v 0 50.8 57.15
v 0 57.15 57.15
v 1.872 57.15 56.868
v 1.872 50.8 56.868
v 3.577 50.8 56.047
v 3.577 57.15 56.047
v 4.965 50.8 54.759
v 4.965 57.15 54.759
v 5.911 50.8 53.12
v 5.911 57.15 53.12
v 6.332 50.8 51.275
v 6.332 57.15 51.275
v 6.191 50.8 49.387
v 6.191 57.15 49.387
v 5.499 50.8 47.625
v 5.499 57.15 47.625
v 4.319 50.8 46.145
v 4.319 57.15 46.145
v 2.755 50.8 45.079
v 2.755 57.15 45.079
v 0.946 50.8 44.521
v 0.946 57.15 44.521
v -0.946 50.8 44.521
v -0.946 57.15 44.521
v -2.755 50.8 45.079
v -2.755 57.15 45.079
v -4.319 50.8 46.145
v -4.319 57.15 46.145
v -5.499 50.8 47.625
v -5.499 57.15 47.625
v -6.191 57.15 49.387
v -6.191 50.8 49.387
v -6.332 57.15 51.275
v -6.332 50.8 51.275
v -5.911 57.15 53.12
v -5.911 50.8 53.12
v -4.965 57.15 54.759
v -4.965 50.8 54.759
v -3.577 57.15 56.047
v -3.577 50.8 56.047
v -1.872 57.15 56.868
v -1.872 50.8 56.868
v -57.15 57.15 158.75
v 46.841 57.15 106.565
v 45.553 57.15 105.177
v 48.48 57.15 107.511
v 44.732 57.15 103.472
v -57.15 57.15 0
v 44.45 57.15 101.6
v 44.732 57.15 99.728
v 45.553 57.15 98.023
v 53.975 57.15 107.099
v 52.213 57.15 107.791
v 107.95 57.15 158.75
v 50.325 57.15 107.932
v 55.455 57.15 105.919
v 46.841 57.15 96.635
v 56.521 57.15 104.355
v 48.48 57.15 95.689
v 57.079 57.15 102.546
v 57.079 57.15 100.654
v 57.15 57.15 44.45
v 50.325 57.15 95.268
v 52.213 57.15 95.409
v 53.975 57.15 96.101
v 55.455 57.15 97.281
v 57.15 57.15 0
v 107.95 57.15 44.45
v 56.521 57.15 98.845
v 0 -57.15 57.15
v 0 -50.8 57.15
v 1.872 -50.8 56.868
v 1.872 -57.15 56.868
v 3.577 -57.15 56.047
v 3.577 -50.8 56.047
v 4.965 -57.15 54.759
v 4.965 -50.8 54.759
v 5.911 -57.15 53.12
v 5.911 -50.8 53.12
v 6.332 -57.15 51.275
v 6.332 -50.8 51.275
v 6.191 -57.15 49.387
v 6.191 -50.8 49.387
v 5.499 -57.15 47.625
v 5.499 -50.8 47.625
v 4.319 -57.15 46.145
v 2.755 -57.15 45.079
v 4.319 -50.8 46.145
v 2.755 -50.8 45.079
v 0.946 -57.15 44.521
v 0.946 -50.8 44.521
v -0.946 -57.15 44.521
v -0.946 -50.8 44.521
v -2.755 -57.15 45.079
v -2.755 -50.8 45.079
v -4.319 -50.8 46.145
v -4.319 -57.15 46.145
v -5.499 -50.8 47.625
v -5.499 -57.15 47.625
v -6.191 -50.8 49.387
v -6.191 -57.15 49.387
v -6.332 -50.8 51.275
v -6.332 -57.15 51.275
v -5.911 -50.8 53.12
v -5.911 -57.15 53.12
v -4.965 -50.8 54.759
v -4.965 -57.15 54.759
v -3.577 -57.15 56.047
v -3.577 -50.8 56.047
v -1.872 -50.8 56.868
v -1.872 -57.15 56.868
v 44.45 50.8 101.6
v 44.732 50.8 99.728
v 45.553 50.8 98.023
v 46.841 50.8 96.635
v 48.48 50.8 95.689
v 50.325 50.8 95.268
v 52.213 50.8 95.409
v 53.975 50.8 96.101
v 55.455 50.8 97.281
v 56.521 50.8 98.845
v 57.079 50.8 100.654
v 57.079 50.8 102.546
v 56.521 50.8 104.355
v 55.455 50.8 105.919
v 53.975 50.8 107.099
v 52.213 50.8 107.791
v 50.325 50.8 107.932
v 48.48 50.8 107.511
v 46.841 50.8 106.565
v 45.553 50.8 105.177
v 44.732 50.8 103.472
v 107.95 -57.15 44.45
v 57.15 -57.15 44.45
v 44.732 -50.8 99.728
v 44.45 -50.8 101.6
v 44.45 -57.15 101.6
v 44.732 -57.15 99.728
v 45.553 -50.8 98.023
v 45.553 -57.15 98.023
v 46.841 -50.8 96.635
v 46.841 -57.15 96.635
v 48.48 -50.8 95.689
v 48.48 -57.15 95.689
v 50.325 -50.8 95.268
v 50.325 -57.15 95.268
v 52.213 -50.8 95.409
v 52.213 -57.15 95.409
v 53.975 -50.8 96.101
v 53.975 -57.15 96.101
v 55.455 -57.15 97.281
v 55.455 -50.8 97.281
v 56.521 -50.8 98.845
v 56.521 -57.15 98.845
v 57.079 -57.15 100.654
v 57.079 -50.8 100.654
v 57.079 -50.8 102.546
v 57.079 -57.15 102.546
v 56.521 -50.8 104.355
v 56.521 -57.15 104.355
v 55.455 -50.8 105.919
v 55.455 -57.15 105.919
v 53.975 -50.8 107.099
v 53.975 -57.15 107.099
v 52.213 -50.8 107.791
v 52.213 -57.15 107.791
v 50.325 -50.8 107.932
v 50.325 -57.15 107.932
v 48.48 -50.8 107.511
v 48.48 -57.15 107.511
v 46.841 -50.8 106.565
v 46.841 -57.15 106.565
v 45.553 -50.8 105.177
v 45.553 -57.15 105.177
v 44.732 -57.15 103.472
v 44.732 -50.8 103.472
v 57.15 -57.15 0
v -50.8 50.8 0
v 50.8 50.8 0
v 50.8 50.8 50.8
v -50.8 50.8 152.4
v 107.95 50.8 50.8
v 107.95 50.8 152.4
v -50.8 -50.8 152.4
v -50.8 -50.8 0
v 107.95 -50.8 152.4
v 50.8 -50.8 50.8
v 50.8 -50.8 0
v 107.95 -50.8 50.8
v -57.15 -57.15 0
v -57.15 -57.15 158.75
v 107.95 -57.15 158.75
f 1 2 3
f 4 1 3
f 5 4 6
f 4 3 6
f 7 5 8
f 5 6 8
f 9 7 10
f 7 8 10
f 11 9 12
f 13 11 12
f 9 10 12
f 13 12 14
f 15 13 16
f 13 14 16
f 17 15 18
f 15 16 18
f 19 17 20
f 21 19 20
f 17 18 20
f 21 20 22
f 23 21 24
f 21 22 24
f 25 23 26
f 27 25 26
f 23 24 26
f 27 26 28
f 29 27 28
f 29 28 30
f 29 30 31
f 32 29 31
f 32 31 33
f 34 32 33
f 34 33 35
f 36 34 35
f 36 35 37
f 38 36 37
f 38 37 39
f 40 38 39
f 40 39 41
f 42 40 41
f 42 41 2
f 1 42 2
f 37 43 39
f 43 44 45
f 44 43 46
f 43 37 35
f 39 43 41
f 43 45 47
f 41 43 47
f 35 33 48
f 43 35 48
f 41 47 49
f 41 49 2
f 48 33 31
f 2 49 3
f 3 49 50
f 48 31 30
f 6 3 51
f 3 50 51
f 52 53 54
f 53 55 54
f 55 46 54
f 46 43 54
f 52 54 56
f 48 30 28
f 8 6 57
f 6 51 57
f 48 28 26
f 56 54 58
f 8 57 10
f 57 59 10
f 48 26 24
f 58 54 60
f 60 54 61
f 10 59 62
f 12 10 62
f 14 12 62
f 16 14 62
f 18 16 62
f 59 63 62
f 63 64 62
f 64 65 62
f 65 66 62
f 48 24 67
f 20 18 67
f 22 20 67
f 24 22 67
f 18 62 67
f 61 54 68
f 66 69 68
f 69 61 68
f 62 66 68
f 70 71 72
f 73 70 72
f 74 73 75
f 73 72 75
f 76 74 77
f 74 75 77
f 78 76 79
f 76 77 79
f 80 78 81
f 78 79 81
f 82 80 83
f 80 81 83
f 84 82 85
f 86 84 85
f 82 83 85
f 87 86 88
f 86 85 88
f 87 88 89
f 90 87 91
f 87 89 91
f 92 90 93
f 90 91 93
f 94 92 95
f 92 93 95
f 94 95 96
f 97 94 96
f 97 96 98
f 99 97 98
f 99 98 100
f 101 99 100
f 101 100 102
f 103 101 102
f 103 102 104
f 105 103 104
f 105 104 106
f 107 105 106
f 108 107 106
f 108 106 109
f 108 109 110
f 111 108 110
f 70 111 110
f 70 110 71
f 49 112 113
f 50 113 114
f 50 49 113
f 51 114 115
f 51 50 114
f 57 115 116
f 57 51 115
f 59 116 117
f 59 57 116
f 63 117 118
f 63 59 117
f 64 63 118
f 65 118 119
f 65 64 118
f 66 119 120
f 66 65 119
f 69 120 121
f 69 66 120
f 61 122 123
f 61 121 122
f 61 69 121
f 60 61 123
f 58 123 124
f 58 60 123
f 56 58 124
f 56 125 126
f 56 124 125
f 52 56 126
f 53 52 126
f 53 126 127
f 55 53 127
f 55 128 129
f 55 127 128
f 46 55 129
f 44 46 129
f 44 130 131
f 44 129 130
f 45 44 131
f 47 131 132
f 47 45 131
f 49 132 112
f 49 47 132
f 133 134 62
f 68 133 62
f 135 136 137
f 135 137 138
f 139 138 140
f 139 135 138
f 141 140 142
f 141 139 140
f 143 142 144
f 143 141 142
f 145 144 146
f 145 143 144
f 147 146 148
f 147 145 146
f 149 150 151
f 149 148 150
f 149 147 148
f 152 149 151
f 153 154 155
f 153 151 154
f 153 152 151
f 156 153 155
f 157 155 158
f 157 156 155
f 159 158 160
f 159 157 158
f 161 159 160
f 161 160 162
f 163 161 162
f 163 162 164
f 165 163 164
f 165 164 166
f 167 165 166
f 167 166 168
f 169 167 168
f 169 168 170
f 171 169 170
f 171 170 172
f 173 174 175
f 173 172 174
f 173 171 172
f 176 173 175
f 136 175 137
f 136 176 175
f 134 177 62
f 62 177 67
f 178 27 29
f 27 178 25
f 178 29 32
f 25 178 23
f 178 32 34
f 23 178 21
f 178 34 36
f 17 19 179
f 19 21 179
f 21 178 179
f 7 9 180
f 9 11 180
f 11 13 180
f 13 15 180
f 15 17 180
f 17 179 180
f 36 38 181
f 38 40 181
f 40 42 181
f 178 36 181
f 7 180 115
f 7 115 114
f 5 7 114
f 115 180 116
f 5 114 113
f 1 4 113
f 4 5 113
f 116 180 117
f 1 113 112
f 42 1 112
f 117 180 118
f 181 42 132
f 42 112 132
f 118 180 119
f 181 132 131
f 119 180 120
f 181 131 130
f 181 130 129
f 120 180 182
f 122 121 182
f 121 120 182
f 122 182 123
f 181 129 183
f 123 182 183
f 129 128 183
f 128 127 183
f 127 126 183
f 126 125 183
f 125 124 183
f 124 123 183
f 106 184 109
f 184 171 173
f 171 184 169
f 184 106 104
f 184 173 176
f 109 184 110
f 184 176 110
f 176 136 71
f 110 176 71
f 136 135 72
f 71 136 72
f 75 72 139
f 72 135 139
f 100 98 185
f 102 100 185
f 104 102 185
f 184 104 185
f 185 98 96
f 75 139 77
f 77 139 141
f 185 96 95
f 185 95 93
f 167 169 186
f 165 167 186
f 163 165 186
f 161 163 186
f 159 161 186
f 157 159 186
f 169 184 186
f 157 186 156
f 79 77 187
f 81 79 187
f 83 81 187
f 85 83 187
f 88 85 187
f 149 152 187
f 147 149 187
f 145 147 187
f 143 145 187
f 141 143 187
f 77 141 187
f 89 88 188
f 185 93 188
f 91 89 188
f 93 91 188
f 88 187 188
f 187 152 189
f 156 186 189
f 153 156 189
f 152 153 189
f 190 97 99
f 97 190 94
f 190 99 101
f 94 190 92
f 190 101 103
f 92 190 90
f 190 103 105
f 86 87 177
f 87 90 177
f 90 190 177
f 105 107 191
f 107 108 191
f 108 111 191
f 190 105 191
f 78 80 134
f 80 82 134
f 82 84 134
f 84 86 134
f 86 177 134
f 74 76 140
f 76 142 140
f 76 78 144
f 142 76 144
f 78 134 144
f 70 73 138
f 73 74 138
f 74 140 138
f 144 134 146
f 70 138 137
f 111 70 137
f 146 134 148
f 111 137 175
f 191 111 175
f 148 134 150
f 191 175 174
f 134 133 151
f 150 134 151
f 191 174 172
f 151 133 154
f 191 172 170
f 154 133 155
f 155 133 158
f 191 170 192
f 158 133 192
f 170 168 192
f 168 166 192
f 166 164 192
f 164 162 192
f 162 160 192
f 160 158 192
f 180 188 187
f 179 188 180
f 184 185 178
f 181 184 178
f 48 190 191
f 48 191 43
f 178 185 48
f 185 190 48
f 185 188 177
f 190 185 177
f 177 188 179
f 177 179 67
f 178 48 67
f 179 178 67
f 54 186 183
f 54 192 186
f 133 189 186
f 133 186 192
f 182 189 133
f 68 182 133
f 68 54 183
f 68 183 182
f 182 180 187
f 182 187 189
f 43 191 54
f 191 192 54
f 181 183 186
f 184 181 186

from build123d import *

# Parameters (mm, degrees)
SKETCH1_W           = 114.3
SKETCH1_H           = 114.3
SKETCH1_W_2         = 101.6
SKETCH1_H_2         = 101.6
EXTRUDE_THIN1_DEPTH = 50.8
SKETCH3_W           = 114.3
SKETCH3_H           = 114.3
SKETCH3_W_2         = 101.6
SKETCH3_H_2         = 101.6
EXTRUDE_THIN2_DEPTH = 50.8
BOSS_EXTRUDE1_DEPTH = 114.3
BOSS_EXTRUDE2_REACH = 165.011
SKETCH5_W           = 6.35
SKETCH5_H           = 101.6
SKETCH6_R           = 6.35
CUT_EXTRUDE1_DEPTH  = 224.426173489


with BuildPart() as part:
    # Sketch1 → Extrude-Thin1 (new body)
    with BuildSketch(Plane.XY):
        Rectangle(SKETCH1_W, SKETCH1_H)
        Rectangle(SKETCH1_W_2, SKETCH1_H_2, mode=Mode.SUBTRACT)
    extrude(amount=EXTRUDE_THIN1_DEPTH)

    # Sketch3 → Extrude-Thin2 (add)
    with BuildSketch(Plane(origin=(57.15, 0, 0), x_dir=(0, 0, -1), z_dir=(1, 0, 0))):
        with Locations((-101.6, 0)):
            Rectangle(SKETCH3_W, SKETCH3_H)
        with Locations((-101.6, 0)):
            Rectangle(SKETCH3_W_2, SKETCH3_H_2, mode=Mode.SUBTRACT)
    extrude(amount=EXTRUDE_THIN2_DEPTH)

    # Sketch4 → Boss-Extrude1 (add)
    with BuildSketch(Plane.ZY.offset(-57.15)):
        Polygon((50.8, -50.8), (50.8, -57.15), (158.75, -57.15), (158.75, 57.15), (50.8, 57.15), (50.8, 50.8), (152.4, 50.8), (152.4, -50.8), align=None)
    extrude(amount=BOSS_EXTRUDE1_DEPTH)

    # Sketch5 → Boss-Extrude2 (add, up to next)
    with BuildSketch(Plane.XY.offset(50.8), mode=Mode.PRIVATE) as boss_extrude2_sk1:
        with Locations((-53.975, 0)):
            Rectangle(SKETCH5_W, SKETCH5_H)
    boss_extrude2_tool1 = extrude(boss_extrude2_sk1.sketch, amount=BOSS_EXTRUDE2_REACH, mode=Mode.PRIVATE) - part.part
    add(boss_extrude2_tool1.solids().sort_by_distance((-53.975, 0, 50.8))[0])

    # Sketch6 → Cut-Extrude1 (cut, through all)
    with BuildSketch(Plane(origin=(0, 57.15, 0), x_dir=(1, 0, 0), z_dir=(0, 1, 0))):
        with Locations(Location((0, -50.8, 0), (0, 0, 270))):
            Circle(SKETCH6_R)
    cut_extrude1 = extrude(amount=-CUT_EXTRUDE1_DEPTH, mode=Mode.SUBTRACT)

    # Mirror1: Cut-Extrude1 across plane
    add(cut_extrude1.mirror(Plane(origin=(50.8, 0, 50.8), x_dir=(-0.7071067811865477, 0, 0.7071067811865474), z_dir=(0.7071067811865476, 0, 0.7071067811865476))), mode=Mode.SUBTRACT)


solid = part.part
